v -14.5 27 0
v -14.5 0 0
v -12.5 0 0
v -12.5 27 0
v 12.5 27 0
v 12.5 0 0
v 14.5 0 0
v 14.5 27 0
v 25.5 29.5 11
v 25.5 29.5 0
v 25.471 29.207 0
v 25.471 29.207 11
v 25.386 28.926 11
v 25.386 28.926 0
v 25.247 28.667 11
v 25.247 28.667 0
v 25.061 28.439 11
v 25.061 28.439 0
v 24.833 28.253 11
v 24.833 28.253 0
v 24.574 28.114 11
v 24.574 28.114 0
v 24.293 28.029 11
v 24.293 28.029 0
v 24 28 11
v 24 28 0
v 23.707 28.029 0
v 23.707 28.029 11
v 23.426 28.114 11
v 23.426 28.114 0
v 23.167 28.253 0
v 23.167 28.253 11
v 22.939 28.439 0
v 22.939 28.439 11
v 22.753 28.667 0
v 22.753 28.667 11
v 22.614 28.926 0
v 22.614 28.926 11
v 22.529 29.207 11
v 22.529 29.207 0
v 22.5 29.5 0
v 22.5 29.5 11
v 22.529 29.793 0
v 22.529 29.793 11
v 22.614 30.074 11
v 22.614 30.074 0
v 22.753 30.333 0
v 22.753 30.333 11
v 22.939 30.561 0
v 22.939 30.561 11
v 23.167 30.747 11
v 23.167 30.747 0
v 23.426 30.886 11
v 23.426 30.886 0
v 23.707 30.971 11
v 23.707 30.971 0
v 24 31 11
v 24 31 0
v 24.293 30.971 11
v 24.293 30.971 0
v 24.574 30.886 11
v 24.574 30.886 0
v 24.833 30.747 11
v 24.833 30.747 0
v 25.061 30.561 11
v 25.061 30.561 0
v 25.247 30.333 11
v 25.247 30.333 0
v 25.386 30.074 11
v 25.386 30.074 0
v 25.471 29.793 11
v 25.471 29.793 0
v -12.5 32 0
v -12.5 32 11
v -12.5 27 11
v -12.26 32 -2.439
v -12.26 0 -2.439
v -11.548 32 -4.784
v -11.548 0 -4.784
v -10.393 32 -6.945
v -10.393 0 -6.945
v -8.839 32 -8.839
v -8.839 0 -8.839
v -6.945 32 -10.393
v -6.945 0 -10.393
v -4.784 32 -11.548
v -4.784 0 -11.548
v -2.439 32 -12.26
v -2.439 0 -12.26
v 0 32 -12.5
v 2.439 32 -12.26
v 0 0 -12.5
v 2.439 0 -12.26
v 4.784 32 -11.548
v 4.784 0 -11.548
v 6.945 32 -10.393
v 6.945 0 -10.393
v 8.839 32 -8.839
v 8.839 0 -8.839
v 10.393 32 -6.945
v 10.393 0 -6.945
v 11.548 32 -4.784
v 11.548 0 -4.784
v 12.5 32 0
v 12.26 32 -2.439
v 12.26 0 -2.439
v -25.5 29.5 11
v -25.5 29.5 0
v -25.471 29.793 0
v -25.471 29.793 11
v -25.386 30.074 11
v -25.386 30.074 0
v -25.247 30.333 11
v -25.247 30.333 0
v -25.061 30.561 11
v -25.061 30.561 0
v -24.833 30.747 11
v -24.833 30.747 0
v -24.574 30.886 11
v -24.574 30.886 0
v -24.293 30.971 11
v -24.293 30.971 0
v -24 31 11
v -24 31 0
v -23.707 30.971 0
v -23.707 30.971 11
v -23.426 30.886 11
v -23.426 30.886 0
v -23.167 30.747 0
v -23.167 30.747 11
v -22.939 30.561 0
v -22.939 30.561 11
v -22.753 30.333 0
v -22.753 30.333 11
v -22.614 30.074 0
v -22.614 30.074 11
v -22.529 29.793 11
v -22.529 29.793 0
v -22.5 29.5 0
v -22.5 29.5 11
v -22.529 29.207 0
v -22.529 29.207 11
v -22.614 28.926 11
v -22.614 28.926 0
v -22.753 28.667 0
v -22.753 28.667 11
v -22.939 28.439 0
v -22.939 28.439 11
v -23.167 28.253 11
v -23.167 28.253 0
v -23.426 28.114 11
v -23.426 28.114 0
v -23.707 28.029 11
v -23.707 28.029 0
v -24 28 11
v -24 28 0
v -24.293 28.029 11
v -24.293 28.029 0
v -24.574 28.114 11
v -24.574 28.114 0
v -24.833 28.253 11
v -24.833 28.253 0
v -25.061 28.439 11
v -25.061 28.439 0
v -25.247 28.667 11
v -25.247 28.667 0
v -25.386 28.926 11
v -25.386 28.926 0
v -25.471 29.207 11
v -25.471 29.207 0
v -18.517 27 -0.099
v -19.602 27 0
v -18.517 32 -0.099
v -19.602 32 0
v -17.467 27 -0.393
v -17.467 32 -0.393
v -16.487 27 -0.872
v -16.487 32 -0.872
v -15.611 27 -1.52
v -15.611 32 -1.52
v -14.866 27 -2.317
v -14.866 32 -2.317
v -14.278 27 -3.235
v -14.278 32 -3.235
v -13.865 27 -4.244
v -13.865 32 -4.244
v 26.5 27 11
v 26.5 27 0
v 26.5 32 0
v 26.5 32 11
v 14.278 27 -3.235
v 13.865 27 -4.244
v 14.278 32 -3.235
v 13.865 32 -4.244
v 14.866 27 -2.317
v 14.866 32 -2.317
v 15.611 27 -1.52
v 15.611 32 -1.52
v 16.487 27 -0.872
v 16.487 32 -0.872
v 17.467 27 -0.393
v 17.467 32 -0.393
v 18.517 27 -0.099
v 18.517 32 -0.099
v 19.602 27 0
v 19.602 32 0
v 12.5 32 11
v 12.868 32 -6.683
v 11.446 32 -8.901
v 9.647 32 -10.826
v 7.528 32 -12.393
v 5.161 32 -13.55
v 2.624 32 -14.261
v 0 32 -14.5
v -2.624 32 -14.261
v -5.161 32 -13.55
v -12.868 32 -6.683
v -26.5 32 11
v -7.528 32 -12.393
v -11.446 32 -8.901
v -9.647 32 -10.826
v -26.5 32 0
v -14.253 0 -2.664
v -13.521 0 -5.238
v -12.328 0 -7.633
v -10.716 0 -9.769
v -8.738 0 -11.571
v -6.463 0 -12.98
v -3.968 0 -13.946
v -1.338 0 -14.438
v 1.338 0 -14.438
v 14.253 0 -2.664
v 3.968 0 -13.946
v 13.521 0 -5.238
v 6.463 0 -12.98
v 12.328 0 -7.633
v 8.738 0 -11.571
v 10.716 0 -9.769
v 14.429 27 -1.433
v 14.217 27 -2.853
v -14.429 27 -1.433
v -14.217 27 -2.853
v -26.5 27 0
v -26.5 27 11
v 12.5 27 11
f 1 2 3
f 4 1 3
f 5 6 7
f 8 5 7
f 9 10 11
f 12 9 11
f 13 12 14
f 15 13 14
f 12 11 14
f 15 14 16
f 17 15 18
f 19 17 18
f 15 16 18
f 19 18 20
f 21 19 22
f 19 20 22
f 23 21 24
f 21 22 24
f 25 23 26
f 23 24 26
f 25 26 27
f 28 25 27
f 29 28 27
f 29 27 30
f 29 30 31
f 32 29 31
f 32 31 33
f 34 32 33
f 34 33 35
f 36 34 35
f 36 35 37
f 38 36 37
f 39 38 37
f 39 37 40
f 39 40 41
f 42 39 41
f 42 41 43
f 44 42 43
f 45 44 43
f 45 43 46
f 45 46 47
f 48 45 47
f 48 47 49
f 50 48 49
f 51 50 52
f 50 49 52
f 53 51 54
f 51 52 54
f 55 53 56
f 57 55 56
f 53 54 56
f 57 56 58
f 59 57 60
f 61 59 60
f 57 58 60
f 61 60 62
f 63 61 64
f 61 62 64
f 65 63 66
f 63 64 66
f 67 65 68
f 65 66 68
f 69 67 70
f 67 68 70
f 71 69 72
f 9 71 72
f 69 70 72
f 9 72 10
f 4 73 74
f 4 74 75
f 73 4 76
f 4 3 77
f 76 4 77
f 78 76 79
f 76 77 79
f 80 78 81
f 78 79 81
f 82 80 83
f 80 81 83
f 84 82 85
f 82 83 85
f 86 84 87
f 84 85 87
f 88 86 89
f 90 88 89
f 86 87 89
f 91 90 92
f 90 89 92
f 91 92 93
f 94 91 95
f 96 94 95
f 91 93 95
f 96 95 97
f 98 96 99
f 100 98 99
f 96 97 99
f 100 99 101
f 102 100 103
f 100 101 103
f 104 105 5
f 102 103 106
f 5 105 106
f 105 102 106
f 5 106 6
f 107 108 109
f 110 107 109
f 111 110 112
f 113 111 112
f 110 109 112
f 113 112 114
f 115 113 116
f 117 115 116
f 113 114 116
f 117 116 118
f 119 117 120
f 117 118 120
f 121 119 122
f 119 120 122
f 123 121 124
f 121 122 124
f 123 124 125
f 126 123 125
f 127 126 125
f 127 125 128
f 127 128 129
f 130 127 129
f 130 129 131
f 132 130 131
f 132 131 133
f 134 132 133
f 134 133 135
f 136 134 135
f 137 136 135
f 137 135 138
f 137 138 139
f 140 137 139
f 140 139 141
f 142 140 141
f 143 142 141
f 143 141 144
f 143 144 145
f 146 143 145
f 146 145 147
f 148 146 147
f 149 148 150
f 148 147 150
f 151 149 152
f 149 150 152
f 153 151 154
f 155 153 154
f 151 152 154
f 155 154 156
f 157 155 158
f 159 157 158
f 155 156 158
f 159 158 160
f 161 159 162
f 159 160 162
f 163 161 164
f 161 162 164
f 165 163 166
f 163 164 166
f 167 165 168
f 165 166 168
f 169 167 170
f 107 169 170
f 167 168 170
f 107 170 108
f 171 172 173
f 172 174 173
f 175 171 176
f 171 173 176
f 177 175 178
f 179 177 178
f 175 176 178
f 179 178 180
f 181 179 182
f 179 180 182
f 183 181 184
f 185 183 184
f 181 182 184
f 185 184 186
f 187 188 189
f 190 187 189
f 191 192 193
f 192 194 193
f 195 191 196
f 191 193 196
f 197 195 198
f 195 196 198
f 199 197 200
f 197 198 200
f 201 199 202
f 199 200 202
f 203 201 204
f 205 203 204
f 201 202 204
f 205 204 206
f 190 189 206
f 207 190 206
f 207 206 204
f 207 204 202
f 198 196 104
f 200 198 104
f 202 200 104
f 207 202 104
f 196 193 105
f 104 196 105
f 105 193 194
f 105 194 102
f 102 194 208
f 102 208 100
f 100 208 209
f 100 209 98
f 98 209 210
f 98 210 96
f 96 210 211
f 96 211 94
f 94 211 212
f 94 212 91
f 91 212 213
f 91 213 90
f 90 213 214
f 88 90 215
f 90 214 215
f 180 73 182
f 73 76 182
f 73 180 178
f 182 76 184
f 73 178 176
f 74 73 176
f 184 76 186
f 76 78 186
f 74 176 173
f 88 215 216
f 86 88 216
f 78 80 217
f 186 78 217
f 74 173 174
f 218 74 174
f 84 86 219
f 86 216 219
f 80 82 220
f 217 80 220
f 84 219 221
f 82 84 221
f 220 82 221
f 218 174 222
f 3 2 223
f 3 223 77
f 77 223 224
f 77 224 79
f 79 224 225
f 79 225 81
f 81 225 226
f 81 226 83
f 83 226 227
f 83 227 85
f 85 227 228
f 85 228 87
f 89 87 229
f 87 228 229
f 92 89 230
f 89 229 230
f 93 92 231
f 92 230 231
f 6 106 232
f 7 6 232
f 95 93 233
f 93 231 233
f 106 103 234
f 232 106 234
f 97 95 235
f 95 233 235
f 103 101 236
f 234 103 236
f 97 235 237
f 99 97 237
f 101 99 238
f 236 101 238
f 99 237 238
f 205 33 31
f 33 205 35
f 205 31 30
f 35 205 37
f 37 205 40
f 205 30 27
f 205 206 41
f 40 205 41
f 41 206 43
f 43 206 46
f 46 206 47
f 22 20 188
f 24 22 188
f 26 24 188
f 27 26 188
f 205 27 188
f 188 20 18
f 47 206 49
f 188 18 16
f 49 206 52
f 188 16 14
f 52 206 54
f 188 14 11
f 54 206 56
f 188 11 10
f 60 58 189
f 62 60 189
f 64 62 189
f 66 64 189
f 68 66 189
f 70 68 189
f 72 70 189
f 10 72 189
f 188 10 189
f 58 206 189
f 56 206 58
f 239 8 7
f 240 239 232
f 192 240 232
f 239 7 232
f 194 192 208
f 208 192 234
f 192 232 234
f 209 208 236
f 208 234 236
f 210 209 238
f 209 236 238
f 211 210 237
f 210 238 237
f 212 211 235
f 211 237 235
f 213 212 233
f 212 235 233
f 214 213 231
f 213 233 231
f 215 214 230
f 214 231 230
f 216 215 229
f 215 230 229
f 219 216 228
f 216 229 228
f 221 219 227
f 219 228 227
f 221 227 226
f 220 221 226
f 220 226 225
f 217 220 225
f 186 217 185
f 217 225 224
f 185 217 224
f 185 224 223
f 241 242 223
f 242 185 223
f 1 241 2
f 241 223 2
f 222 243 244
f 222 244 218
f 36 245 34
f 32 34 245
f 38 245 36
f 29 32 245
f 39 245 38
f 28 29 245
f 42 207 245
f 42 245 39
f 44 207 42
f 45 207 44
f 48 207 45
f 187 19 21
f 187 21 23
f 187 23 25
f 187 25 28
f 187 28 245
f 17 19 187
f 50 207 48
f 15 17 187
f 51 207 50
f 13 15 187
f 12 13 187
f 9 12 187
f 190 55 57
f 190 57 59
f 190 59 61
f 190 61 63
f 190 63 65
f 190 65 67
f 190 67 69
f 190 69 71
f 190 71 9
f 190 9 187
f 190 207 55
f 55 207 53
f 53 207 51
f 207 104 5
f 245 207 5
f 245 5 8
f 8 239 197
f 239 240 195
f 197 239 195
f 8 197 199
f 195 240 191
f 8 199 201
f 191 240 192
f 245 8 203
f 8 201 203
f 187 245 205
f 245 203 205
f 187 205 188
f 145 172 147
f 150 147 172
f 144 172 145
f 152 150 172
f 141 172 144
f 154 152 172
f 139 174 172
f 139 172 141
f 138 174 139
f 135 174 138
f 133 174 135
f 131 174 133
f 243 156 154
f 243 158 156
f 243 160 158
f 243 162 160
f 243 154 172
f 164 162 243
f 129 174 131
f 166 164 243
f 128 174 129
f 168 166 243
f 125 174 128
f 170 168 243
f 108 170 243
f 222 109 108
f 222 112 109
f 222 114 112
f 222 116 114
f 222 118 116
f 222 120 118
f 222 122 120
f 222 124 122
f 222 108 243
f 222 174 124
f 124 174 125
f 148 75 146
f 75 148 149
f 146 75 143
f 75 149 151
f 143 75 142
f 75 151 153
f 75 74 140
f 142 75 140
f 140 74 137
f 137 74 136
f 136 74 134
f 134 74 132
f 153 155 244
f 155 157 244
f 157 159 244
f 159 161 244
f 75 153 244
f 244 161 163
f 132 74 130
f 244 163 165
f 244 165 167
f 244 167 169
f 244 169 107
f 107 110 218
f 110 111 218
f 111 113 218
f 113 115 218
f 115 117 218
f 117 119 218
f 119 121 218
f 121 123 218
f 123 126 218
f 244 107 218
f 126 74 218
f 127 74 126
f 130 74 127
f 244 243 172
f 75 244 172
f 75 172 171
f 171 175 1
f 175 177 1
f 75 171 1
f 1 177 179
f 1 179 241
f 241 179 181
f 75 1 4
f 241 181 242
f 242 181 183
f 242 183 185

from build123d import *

# Parameters (mm, degrees)
BOSS_EXTRUDE1_DEPTH = 32
BOSS_EXTRUDE2_DEPTH = 11
SKETCH3_R           = 1.5
CUT_EXTRUDE1_DEPTH  = 45.005681451
FILLET1_R           = 6


with BuildPart() as part:
    # Sketch1 → Boss-Extrude1 (new body)
    with BuildSketch(Plane(origin=(0, 0, 0), x_dir=(1, 0, 0), z_dir=(0, 1, 0))):
        with BuildLine():
            Line((-14.5, 0), (-12.5, 0))
            ThreePointArc((-12.5, 0), (0, 12.5), (12.5, 0))
            Line((12.5, 0), (14.5, 0))
            ThreePointArc((14.5, 0), (0, 14.5), (-14.5, 0))
        make_face()
    extrude(amount=BOSS_EXTRUDE1_DEPTH)

    # Sketch2 → Boss-Extrude2 (add)
    with BuildSketch(Plane.XY):
        Polygon((-14.5, 32), (-12.5, 32), (-12.5, 27), (-14.5, 27), (-26.5, 27), (-26.5, 32), align=None)
        Polygon((12.5, 32), (12.5, 27), (14.5, 27), (26.5, 27), (26.5, 32), (14.5, 32), align=None)
    extrude(amount=BOSS_EXTRUDE2_DEPTH)

    # Sketch3 → Cut-Extrude1 (cut, through all)
    with BuildSketch(Plane(origin=(0, 0, 0), x_dir=(-1, 0, 0), z_dir=(0, 0, -1))):
        with Locations((24, 29.5)):
            Circle(SKETCH3_R)
        with Locations(Location((-24, 29.5, 0), (0, 0, 180))):
            Circle(SKETCH3_R)
    extrude(amount=-CUT_EXTRUDE1_DEPTH, mode=Mode.SUBTRACT)

    # Fillet1
    fillet1_edges = [part.edges().sort_by_distance(p)[0] for p in [
        (-14.5, 29.5, 0),
        (14.5, 29.5, 0),
    ]]
    fillet(fillet1_edges, radius=FILLET1_R)


solid = part.part
